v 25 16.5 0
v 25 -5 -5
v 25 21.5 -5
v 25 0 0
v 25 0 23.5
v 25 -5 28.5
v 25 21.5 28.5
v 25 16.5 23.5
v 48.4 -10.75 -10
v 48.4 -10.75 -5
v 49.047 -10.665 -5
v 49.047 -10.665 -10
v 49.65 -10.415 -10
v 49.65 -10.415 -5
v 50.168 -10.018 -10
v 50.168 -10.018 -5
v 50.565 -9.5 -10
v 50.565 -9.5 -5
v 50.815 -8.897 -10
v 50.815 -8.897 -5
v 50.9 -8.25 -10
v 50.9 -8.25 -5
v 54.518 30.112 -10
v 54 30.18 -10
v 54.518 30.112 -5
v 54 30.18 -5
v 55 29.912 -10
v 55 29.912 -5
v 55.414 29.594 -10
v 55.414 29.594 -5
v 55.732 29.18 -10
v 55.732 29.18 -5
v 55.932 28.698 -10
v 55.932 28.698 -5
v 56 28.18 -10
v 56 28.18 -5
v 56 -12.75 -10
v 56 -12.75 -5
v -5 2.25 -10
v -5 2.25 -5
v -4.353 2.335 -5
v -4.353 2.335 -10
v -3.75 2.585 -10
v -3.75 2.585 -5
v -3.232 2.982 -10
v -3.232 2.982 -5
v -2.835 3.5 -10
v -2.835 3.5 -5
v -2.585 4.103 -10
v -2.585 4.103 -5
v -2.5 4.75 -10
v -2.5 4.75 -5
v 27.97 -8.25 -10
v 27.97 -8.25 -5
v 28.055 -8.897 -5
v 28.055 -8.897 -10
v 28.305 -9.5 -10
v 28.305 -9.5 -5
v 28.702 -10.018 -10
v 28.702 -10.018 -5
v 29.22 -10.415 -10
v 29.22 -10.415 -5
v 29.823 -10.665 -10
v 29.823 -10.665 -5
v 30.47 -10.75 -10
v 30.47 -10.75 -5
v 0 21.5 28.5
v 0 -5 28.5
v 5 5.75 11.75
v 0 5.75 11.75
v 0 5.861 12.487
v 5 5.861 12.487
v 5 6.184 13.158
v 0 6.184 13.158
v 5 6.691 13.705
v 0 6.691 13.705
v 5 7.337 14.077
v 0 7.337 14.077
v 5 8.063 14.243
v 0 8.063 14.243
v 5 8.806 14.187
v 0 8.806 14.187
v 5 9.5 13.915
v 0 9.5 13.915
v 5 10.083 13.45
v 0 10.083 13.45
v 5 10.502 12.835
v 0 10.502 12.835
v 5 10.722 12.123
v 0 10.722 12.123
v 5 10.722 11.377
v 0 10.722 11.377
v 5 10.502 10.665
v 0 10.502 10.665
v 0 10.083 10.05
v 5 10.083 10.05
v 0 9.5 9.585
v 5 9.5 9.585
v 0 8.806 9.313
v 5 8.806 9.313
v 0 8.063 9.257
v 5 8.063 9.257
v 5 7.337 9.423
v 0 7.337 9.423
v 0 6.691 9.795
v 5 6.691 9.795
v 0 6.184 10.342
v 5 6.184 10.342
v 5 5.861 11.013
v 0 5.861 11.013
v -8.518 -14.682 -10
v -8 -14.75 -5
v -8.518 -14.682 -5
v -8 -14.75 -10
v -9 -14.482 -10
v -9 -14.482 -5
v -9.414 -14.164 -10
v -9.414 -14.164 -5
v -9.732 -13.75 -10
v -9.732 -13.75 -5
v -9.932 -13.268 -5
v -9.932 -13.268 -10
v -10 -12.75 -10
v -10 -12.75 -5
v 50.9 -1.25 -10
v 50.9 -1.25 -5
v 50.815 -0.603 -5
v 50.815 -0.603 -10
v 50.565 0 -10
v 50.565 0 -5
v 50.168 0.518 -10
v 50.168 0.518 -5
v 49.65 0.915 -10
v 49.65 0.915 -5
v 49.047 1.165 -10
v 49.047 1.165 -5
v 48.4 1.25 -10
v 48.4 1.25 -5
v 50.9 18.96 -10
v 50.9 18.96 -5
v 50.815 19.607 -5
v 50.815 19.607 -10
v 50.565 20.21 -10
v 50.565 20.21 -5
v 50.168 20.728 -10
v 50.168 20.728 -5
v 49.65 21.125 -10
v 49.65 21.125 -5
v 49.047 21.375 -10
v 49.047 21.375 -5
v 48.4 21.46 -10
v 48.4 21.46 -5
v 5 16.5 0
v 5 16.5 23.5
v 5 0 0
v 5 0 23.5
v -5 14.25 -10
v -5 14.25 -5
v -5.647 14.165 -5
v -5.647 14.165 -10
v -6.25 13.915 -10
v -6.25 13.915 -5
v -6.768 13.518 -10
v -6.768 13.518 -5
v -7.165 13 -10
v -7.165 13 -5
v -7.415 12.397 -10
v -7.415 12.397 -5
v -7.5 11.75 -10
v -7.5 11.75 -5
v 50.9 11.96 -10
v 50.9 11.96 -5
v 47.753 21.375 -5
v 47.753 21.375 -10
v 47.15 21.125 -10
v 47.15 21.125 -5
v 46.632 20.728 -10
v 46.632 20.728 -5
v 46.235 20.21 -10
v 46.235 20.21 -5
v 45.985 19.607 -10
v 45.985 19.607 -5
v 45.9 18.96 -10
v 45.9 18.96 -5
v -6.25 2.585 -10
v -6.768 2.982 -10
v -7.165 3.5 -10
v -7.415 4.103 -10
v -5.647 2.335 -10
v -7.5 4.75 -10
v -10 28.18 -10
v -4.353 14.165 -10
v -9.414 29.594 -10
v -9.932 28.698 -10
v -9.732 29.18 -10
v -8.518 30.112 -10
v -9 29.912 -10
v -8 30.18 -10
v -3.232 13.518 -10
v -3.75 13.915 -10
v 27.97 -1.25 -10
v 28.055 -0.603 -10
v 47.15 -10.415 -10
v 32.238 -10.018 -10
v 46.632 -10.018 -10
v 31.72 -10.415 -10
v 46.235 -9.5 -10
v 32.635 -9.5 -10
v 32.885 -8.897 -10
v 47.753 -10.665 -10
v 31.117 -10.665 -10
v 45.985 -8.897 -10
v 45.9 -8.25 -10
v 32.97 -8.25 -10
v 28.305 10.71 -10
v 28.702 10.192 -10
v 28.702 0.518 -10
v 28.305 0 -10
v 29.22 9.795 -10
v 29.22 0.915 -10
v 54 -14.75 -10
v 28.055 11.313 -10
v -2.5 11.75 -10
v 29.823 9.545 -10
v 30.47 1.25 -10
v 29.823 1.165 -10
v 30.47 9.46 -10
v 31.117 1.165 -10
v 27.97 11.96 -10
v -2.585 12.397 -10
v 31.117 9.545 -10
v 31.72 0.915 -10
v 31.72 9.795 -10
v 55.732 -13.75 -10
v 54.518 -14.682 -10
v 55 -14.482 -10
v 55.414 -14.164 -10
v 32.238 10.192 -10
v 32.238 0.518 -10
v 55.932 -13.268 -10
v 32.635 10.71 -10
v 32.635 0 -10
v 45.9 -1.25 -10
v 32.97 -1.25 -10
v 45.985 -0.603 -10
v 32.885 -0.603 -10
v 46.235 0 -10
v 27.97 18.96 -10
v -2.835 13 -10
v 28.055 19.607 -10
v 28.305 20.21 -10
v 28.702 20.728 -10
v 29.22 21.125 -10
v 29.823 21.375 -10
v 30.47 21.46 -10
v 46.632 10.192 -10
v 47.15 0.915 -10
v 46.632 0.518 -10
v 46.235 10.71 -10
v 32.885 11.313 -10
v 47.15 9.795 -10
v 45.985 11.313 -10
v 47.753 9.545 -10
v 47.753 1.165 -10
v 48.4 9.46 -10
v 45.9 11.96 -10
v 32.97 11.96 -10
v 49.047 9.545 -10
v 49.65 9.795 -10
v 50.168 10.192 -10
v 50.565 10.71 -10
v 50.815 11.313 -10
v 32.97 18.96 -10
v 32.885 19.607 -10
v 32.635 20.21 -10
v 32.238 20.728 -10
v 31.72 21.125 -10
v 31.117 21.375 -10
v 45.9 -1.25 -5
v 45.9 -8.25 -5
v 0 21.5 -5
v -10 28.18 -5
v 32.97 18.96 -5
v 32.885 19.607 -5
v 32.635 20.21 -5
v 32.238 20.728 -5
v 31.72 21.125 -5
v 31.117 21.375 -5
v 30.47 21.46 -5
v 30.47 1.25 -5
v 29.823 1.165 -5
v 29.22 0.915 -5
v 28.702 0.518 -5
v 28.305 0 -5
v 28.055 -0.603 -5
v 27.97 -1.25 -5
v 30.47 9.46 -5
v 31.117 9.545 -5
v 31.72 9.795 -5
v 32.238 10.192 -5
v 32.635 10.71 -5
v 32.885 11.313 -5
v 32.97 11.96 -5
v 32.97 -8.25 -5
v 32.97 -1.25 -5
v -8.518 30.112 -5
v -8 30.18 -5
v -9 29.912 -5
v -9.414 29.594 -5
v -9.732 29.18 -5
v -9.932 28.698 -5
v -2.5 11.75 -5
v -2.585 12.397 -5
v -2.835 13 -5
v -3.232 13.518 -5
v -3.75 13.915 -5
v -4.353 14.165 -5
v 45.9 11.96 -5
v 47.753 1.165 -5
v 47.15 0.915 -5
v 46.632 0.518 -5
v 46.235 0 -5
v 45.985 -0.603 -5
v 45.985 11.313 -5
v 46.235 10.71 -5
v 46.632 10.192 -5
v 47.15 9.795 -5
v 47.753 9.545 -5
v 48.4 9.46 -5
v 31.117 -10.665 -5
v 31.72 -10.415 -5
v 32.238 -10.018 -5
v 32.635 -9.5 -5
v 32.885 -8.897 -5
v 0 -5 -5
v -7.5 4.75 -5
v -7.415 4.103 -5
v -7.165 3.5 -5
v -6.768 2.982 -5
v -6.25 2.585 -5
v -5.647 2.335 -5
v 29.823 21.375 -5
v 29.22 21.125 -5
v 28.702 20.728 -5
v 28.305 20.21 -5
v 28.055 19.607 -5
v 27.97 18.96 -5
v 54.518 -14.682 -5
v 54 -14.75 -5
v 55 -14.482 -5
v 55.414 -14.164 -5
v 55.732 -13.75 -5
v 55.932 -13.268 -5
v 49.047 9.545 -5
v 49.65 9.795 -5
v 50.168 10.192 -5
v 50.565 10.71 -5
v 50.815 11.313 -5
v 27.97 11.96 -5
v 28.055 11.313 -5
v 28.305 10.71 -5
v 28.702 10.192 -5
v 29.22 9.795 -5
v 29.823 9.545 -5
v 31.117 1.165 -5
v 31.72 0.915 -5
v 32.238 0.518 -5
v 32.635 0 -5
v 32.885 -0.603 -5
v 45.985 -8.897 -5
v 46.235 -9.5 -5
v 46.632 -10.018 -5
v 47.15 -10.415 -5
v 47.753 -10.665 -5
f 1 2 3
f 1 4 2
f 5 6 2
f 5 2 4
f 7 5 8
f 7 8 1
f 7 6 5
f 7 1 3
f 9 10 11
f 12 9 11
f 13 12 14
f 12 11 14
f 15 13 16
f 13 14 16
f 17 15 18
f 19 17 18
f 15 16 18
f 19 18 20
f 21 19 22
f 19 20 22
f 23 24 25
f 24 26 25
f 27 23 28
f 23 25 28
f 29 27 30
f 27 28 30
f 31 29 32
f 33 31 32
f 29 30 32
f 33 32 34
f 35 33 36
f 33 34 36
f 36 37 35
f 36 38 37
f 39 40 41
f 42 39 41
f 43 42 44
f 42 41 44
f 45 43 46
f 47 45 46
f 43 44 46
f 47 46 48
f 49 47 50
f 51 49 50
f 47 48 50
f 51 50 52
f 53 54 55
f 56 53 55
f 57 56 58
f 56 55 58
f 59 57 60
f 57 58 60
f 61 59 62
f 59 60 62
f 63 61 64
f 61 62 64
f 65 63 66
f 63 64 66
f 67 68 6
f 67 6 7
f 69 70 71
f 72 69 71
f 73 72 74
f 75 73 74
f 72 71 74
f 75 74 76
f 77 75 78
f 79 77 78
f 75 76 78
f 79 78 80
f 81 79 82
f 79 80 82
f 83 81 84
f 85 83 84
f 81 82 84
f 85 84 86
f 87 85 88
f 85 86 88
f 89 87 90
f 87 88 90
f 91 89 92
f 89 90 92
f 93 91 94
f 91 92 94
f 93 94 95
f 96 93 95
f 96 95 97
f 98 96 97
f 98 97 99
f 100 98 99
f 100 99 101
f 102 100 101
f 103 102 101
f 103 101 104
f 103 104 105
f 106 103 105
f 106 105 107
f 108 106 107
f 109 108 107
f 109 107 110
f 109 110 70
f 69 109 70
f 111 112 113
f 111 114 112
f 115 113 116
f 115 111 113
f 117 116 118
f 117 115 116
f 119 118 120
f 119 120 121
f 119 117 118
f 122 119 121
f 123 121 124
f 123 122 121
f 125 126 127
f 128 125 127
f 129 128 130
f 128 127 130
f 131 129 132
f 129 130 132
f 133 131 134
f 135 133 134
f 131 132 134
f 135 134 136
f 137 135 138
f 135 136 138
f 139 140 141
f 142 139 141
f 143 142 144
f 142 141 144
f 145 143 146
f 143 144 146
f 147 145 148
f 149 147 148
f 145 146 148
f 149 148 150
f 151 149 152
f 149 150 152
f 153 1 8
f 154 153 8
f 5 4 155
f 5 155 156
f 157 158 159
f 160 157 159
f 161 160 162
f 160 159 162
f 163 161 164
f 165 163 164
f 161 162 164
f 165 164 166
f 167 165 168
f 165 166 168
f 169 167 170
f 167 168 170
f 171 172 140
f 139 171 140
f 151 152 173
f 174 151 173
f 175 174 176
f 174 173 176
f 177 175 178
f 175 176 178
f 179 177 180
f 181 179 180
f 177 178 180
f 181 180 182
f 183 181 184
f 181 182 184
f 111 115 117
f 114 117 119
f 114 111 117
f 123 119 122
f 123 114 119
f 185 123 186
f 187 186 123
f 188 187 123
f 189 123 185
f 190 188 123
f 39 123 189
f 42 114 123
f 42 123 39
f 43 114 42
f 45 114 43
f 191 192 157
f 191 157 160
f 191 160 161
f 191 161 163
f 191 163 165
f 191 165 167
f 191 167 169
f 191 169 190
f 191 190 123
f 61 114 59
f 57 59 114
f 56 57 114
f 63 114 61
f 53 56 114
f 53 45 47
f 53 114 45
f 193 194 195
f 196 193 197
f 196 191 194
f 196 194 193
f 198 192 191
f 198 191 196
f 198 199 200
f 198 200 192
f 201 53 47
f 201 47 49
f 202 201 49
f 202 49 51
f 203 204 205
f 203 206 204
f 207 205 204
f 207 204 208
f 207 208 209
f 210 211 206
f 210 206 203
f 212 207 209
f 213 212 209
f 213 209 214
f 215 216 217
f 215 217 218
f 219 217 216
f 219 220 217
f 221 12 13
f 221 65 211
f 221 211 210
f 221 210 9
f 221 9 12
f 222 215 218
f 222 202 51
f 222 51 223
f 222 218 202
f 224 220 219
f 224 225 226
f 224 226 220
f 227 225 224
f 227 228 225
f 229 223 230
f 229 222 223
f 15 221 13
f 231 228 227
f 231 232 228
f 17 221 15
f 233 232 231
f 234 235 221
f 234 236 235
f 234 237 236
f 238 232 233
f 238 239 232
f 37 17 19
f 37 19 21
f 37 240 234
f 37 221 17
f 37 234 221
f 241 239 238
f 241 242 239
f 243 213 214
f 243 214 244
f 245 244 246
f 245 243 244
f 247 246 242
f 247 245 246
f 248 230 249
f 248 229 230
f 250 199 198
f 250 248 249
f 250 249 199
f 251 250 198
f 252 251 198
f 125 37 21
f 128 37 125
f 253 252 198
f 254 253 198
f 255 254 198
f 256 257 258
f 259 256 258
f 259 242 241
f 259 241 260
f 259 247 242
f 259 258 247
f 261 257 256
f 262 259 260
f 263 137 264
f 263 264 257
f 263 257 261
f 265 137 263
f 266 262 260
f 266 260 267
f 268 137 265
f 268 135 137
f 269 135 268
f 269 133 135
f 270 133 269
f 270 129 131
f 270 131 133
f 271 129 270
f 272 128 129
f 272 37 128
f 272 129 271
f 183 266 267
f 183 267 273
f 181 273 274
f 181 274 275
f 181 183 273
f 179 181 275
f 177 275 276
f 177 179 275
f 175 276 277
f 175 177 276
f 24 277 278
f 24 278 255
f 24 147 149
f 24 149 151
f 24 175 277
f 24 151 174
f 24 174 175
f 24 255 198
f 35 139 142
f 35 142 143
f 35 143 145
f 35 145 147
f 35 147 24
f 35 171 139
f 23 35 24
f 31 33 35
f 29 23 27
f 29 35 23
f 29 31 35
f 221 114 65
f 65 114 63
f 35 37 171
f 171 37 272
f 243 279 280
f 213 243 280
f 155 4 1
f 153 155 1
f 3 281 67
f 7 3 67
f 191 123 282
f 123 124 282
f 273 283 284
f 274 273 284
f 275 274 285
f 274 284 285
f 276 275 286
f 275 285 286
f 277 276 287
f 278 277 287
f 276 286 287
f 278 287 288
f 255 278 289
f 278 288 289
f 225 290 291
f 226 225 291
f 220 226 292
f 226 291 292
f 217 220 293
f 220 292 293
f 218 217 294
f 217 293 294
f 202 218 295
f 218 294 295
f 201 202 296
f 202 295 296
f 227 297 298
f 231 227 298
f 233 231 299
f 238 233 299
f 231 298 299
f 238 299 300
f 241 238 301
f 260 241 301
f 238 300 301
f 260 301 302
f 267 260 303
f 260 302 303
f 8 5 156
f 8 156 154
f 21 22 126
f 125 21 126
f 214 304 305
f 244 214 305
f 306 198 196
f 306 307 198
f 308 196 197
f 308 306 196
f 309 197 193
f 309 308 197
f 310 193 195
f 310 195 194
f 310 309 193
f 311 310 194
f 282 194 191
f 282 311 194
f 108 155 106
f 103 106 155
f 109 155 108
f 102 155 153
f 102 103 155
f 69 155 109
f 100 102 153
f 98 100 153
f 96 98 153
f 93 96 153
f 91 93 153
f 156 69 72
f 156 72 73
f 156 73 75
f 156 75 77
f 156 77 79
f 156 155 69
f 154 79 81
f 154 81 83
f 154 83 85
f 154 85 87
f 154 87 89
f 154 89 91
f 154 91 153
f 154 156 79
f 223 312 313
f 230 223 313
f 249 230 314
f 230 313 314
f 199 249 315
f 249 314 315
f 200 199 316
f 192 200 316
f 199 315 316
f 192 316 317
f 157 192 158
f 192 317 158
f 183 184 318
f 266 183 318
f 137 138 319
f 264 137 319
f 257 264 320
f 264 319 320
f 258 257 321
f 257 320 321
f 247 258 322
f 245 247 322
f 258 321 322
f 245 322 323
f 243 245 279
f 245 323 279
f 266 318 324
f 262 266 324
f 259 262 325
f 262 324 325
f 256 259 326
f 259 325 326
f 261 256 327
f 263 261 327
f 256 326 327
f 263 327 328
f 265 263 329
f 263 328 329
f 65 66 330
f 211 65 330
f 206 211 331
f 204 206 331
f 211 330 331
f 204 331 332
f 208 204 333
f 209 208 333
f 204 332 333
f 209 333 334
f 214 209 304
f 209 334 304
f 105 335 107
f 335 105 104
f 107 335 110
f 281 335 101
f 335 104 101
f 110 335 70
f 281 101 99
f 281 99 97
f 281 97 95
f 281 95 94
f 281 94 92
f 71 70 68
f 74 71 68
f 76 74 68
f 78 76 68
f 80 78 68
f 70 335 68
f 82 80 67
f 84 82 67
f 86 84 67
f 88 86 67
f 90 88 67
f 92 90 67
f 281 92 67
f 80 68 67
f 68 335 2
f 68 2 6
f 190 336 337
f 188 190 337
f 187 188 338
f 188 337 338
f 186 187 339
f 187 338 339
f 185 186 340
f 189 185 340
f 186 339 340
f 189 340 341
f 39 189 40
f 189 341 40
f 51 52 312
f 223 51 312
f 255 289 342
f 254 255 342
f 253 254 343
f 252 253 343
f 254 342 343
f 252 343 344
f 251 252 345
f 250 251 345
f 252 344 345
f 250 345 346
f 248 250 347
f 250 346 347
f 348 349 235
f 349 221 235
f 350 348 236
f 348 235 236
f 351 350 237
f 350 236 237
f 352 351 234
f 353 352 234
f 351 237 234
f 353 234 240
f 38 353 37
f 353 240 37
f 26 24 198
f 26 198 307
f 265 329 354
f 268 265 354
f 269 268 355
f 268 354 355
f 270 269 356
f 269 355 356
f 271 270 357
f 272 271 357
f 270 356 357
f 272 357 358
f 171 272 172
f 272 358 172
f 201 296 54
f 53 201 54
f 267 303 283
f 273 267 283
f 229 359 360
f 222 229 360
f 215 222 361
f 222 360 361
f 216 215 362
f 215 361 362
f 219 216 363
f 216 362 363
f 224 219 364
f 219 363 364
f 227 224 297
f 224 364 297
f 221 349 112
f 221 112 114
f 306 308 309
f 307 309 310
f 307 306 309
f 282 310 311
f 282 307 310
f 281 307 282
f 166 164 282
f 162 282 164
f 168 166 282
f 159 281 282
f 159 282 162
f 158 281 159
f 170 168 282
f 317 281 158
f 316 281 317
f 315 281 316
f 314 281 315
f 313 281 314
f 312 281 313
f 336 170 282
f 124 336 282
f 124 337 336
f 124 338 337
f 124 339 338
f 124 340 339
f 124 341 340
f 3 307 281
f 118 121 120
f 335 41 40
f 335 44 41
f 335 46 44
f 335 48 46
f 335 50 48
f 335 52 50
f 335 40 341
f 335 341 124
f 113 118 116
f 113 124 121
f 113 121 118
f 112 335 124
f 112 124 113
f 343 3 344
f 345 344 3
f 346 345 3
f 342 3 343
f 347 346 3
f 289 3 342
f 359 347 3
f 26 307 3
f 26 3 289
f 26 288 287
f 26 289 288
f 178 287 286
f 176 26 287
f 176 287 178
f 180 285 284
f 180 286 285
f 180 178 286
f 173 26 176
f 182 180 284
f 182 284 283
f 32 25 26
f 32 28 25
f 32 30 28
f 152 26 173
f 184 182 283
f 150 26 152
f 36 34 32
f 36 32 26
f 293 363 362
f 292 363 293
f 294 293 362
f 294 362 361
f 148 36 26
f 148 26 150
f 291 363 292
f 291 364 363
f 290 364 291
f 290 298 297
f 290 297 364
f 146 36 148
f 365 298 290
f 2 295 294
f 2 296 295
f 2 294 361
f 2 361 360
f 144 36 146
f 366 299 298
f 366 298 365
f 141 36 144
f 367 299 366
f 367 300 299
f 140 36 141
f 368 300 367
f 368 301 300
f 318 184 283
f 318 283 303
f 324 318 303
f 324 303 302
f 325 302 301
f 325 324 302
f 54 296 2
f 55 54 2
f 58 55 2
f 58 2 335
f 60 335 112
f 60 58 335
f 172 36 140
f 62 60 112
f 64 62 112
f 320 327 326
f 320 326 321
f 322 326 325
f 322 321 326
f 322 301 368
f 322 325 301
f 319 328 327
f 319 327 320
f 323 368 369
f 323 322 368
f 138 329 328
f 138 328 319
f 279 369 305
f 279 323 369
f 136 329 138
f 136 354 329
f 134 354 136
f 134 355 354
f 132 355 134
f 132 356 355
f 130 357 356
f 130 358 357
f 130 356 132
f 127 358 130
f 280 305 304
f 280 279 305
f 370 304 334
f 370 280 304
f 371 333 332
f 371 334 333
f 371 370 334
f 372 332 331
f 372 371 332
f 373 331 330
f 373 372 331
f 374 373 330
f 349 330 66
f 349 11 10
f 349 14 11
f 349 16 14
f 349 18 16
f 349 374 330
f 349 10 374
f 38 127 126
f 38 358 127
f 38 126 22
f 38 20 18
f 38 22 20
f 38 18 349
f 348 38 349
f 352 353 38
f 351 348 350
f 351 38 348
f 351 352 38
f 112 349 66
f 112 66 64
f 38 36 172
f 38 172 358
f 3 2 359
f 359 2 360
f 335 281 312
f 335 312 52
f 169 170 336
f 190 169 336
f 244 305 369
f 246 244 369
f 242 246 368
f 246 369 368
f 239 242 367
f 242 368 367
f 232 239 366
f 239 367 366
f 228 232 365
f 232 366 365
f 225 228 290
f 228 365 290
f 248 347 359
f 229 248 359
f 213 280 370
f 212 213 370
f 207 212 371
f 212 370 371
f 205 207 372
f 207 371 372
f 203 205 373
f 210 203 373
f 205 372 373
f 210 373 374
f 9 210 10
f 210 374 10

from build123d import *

# Parameters (mm, degrees)
F0_W          = 26.5
F0_H          = 33.5
F1_DEPTH      = 25
F2_W          = 16.5
F2_H          = 23.5
F3_DEPTH      = 20
F4_R          = 2.5
F5_DEPTH      = 25.001
F7_DEPTH      = 31
F7_DEPTH_BACK = 35
F8_R          = 2
F10_DEPTH     = 5


# Not quite as in the source:
# - a feature names something its author has since deleted; it is built from what else it names


with BuildPart() as f1:
    # F0 (on Right) → F1 (new body)
    with BuildSketch(Plane.YZ):
        with Locations((8.25, 11.75)):
            Rectangle(F0_W, F0_H)
    extrude(amount=F1_DEPTH)

    # F2 (on face) → F3 (cut)
    with BuildSketch(Plane.YZ.offset(25)):
        with Locations((8.25, 11.75)):
            Rectangle(F2_W, F2_H)
    extrude(amount=-F3_DEPTH, mode=Mode.SUBTRACT)

    # F4 (on face) → F5 (cut, through all)
    with BuildSketch(Plane(origin=(0, 0, 0), x_dir=(0, -1, 0), z_dir=(-1, 0, 0))):
        with Locations((-8.25, 11.75)):
            Circle(F4_R)
    extrude(amount=-F5_DEPTH, mode=Mode.SUBTRACT)

    # F6 (on face) → F7 (join, two sides)
    with BuildSketch(Plane.YZ.offset(25)) as f7_sk:
        Polygon((-5, -5), (-14.75, -5), (-14.75, -10), (30.18, -10), (30.18, -5), (21.5, -5), align=None)
    extrude(amount=F7_DEPTH)
    extrude(f7_sk.sketch, amount=-F7_DEPTH_BACK)

    # F8
    f8_edges = [f1.edges().sort_by_distance(p)[0] for p in [
        (56, -14.75, -7.5),
        (56, 30.18, -7.5),
        (-10, -14.75, -7.5),
        (-10, 30.18, -7.5),
    ]]
    fillet(f8_edges, radius=F8_R)

    # F9 (on face) → F10 (cut, through all)
    with BuildSketch(Plane.XY.offset(-5)):
        with BuildLine():
            ThreePointArc((30.47, 21.46), (28.702233047, 20.727766953), (27.97, 18.96))
            Line((27.97, 18.96), (27.97, 11.96))
            ThreePointArc((27.97, 11.96), (28.702233047, 10.192233047), (30.47, 9.46))
            ThreePointArc((30.47, 9.46), (32.237766953, 10.192233047), (32.97, 11.96))
            Line((32.97, 11.96), (32.97, 18.96))
            ThreePointArc((32.97, 18.96), (32.237766953, 20.727766953), (30.47, 21.46))
        make_face()
        with BuildLine():
            ThreePointArc((30.47, 1.25), (28.702233047, 0.517766953), (27.97, -1.25))
            Line((27.97, -1.25), (27.97, -8.25))
            ThreePointArc((27.97, -8.25), (28.702233047, -10.017766953), (30.47, -10.75))
            ThreePointArc((30.47, -10.75), (32.237766953, -10.017766953), (32.97, -8.25))
            Line((32.97, -8.25), (32.97, -1.25))
            ThreePointArc((32.97, -1.25), (32.237766953, 0.517766953), (30.47, 1.25))
        make_face()
        with BuildLine():
            ThreePointArc((48.4, 21.46), (46.632233047, 20.727766953), (45.9, 18.96))
            Line((45.9, 18.96), (45.9, 11.96))
            ThreePointArc((45.9, 11.96), (46.632233047, 10.192233047), (48.4, 9.46))
            ThreePointArc((48.4, 9.46), (50.167766953, 10.192233047), (50.9, 11.96))
            Line((50.9, 11.96), (50.9, 18.96))
            ThreePointArc((50.9, 18.96), (50.167766953, 20.727766953), (48.4, 21.46))
        make_face()
        with BuildLine():
            ThreePointArc((48.4, 1.25), (46.632233047, 0.517766953), (45.9, -1.25))
            Line((45.9, -1.25), (45.9, -8.25))
            ThreePointArc((45.9, -8.25), (46.632233047, -10.017766953), (48.4, -10.75))
            ThreePointArc((48.4, -10.75), (50.167766953, -10.017766953), (50.9, -8.25))
            Line((50.9, -8.25), (50.9, -1.25))
            ThreePointArc((50.9, -1.25), (50.167766953, 0.517766953), (48.4, 1.25))
        make_face()
        with BuildLine():
            ThreePointArc((-5, 14.25), (-6.767766953, 13.517766953), (-7.5, 11.75))
            Line((-7.5, 11.75), (-7.5, 4.75))
            ThreePointArc((-7.5, 4.75), (-6.767766953, 2.982233047), (-5, 2.25))
            ThreePointArc((-5, 2.25), (-3.232233047, 2.982233047), (-2.5, 4.75))
            Line((-2.5, 4.75), (-2.5, 11.75))
            ThreePointArc((-2.5, 11.75), (-3.232233047, 13.517766953), (-5, 14.25))
        make_face()
    extrude(amount=-F10_DEPTH, mode=Mode.SUBTRACT)


solid = f1.part
